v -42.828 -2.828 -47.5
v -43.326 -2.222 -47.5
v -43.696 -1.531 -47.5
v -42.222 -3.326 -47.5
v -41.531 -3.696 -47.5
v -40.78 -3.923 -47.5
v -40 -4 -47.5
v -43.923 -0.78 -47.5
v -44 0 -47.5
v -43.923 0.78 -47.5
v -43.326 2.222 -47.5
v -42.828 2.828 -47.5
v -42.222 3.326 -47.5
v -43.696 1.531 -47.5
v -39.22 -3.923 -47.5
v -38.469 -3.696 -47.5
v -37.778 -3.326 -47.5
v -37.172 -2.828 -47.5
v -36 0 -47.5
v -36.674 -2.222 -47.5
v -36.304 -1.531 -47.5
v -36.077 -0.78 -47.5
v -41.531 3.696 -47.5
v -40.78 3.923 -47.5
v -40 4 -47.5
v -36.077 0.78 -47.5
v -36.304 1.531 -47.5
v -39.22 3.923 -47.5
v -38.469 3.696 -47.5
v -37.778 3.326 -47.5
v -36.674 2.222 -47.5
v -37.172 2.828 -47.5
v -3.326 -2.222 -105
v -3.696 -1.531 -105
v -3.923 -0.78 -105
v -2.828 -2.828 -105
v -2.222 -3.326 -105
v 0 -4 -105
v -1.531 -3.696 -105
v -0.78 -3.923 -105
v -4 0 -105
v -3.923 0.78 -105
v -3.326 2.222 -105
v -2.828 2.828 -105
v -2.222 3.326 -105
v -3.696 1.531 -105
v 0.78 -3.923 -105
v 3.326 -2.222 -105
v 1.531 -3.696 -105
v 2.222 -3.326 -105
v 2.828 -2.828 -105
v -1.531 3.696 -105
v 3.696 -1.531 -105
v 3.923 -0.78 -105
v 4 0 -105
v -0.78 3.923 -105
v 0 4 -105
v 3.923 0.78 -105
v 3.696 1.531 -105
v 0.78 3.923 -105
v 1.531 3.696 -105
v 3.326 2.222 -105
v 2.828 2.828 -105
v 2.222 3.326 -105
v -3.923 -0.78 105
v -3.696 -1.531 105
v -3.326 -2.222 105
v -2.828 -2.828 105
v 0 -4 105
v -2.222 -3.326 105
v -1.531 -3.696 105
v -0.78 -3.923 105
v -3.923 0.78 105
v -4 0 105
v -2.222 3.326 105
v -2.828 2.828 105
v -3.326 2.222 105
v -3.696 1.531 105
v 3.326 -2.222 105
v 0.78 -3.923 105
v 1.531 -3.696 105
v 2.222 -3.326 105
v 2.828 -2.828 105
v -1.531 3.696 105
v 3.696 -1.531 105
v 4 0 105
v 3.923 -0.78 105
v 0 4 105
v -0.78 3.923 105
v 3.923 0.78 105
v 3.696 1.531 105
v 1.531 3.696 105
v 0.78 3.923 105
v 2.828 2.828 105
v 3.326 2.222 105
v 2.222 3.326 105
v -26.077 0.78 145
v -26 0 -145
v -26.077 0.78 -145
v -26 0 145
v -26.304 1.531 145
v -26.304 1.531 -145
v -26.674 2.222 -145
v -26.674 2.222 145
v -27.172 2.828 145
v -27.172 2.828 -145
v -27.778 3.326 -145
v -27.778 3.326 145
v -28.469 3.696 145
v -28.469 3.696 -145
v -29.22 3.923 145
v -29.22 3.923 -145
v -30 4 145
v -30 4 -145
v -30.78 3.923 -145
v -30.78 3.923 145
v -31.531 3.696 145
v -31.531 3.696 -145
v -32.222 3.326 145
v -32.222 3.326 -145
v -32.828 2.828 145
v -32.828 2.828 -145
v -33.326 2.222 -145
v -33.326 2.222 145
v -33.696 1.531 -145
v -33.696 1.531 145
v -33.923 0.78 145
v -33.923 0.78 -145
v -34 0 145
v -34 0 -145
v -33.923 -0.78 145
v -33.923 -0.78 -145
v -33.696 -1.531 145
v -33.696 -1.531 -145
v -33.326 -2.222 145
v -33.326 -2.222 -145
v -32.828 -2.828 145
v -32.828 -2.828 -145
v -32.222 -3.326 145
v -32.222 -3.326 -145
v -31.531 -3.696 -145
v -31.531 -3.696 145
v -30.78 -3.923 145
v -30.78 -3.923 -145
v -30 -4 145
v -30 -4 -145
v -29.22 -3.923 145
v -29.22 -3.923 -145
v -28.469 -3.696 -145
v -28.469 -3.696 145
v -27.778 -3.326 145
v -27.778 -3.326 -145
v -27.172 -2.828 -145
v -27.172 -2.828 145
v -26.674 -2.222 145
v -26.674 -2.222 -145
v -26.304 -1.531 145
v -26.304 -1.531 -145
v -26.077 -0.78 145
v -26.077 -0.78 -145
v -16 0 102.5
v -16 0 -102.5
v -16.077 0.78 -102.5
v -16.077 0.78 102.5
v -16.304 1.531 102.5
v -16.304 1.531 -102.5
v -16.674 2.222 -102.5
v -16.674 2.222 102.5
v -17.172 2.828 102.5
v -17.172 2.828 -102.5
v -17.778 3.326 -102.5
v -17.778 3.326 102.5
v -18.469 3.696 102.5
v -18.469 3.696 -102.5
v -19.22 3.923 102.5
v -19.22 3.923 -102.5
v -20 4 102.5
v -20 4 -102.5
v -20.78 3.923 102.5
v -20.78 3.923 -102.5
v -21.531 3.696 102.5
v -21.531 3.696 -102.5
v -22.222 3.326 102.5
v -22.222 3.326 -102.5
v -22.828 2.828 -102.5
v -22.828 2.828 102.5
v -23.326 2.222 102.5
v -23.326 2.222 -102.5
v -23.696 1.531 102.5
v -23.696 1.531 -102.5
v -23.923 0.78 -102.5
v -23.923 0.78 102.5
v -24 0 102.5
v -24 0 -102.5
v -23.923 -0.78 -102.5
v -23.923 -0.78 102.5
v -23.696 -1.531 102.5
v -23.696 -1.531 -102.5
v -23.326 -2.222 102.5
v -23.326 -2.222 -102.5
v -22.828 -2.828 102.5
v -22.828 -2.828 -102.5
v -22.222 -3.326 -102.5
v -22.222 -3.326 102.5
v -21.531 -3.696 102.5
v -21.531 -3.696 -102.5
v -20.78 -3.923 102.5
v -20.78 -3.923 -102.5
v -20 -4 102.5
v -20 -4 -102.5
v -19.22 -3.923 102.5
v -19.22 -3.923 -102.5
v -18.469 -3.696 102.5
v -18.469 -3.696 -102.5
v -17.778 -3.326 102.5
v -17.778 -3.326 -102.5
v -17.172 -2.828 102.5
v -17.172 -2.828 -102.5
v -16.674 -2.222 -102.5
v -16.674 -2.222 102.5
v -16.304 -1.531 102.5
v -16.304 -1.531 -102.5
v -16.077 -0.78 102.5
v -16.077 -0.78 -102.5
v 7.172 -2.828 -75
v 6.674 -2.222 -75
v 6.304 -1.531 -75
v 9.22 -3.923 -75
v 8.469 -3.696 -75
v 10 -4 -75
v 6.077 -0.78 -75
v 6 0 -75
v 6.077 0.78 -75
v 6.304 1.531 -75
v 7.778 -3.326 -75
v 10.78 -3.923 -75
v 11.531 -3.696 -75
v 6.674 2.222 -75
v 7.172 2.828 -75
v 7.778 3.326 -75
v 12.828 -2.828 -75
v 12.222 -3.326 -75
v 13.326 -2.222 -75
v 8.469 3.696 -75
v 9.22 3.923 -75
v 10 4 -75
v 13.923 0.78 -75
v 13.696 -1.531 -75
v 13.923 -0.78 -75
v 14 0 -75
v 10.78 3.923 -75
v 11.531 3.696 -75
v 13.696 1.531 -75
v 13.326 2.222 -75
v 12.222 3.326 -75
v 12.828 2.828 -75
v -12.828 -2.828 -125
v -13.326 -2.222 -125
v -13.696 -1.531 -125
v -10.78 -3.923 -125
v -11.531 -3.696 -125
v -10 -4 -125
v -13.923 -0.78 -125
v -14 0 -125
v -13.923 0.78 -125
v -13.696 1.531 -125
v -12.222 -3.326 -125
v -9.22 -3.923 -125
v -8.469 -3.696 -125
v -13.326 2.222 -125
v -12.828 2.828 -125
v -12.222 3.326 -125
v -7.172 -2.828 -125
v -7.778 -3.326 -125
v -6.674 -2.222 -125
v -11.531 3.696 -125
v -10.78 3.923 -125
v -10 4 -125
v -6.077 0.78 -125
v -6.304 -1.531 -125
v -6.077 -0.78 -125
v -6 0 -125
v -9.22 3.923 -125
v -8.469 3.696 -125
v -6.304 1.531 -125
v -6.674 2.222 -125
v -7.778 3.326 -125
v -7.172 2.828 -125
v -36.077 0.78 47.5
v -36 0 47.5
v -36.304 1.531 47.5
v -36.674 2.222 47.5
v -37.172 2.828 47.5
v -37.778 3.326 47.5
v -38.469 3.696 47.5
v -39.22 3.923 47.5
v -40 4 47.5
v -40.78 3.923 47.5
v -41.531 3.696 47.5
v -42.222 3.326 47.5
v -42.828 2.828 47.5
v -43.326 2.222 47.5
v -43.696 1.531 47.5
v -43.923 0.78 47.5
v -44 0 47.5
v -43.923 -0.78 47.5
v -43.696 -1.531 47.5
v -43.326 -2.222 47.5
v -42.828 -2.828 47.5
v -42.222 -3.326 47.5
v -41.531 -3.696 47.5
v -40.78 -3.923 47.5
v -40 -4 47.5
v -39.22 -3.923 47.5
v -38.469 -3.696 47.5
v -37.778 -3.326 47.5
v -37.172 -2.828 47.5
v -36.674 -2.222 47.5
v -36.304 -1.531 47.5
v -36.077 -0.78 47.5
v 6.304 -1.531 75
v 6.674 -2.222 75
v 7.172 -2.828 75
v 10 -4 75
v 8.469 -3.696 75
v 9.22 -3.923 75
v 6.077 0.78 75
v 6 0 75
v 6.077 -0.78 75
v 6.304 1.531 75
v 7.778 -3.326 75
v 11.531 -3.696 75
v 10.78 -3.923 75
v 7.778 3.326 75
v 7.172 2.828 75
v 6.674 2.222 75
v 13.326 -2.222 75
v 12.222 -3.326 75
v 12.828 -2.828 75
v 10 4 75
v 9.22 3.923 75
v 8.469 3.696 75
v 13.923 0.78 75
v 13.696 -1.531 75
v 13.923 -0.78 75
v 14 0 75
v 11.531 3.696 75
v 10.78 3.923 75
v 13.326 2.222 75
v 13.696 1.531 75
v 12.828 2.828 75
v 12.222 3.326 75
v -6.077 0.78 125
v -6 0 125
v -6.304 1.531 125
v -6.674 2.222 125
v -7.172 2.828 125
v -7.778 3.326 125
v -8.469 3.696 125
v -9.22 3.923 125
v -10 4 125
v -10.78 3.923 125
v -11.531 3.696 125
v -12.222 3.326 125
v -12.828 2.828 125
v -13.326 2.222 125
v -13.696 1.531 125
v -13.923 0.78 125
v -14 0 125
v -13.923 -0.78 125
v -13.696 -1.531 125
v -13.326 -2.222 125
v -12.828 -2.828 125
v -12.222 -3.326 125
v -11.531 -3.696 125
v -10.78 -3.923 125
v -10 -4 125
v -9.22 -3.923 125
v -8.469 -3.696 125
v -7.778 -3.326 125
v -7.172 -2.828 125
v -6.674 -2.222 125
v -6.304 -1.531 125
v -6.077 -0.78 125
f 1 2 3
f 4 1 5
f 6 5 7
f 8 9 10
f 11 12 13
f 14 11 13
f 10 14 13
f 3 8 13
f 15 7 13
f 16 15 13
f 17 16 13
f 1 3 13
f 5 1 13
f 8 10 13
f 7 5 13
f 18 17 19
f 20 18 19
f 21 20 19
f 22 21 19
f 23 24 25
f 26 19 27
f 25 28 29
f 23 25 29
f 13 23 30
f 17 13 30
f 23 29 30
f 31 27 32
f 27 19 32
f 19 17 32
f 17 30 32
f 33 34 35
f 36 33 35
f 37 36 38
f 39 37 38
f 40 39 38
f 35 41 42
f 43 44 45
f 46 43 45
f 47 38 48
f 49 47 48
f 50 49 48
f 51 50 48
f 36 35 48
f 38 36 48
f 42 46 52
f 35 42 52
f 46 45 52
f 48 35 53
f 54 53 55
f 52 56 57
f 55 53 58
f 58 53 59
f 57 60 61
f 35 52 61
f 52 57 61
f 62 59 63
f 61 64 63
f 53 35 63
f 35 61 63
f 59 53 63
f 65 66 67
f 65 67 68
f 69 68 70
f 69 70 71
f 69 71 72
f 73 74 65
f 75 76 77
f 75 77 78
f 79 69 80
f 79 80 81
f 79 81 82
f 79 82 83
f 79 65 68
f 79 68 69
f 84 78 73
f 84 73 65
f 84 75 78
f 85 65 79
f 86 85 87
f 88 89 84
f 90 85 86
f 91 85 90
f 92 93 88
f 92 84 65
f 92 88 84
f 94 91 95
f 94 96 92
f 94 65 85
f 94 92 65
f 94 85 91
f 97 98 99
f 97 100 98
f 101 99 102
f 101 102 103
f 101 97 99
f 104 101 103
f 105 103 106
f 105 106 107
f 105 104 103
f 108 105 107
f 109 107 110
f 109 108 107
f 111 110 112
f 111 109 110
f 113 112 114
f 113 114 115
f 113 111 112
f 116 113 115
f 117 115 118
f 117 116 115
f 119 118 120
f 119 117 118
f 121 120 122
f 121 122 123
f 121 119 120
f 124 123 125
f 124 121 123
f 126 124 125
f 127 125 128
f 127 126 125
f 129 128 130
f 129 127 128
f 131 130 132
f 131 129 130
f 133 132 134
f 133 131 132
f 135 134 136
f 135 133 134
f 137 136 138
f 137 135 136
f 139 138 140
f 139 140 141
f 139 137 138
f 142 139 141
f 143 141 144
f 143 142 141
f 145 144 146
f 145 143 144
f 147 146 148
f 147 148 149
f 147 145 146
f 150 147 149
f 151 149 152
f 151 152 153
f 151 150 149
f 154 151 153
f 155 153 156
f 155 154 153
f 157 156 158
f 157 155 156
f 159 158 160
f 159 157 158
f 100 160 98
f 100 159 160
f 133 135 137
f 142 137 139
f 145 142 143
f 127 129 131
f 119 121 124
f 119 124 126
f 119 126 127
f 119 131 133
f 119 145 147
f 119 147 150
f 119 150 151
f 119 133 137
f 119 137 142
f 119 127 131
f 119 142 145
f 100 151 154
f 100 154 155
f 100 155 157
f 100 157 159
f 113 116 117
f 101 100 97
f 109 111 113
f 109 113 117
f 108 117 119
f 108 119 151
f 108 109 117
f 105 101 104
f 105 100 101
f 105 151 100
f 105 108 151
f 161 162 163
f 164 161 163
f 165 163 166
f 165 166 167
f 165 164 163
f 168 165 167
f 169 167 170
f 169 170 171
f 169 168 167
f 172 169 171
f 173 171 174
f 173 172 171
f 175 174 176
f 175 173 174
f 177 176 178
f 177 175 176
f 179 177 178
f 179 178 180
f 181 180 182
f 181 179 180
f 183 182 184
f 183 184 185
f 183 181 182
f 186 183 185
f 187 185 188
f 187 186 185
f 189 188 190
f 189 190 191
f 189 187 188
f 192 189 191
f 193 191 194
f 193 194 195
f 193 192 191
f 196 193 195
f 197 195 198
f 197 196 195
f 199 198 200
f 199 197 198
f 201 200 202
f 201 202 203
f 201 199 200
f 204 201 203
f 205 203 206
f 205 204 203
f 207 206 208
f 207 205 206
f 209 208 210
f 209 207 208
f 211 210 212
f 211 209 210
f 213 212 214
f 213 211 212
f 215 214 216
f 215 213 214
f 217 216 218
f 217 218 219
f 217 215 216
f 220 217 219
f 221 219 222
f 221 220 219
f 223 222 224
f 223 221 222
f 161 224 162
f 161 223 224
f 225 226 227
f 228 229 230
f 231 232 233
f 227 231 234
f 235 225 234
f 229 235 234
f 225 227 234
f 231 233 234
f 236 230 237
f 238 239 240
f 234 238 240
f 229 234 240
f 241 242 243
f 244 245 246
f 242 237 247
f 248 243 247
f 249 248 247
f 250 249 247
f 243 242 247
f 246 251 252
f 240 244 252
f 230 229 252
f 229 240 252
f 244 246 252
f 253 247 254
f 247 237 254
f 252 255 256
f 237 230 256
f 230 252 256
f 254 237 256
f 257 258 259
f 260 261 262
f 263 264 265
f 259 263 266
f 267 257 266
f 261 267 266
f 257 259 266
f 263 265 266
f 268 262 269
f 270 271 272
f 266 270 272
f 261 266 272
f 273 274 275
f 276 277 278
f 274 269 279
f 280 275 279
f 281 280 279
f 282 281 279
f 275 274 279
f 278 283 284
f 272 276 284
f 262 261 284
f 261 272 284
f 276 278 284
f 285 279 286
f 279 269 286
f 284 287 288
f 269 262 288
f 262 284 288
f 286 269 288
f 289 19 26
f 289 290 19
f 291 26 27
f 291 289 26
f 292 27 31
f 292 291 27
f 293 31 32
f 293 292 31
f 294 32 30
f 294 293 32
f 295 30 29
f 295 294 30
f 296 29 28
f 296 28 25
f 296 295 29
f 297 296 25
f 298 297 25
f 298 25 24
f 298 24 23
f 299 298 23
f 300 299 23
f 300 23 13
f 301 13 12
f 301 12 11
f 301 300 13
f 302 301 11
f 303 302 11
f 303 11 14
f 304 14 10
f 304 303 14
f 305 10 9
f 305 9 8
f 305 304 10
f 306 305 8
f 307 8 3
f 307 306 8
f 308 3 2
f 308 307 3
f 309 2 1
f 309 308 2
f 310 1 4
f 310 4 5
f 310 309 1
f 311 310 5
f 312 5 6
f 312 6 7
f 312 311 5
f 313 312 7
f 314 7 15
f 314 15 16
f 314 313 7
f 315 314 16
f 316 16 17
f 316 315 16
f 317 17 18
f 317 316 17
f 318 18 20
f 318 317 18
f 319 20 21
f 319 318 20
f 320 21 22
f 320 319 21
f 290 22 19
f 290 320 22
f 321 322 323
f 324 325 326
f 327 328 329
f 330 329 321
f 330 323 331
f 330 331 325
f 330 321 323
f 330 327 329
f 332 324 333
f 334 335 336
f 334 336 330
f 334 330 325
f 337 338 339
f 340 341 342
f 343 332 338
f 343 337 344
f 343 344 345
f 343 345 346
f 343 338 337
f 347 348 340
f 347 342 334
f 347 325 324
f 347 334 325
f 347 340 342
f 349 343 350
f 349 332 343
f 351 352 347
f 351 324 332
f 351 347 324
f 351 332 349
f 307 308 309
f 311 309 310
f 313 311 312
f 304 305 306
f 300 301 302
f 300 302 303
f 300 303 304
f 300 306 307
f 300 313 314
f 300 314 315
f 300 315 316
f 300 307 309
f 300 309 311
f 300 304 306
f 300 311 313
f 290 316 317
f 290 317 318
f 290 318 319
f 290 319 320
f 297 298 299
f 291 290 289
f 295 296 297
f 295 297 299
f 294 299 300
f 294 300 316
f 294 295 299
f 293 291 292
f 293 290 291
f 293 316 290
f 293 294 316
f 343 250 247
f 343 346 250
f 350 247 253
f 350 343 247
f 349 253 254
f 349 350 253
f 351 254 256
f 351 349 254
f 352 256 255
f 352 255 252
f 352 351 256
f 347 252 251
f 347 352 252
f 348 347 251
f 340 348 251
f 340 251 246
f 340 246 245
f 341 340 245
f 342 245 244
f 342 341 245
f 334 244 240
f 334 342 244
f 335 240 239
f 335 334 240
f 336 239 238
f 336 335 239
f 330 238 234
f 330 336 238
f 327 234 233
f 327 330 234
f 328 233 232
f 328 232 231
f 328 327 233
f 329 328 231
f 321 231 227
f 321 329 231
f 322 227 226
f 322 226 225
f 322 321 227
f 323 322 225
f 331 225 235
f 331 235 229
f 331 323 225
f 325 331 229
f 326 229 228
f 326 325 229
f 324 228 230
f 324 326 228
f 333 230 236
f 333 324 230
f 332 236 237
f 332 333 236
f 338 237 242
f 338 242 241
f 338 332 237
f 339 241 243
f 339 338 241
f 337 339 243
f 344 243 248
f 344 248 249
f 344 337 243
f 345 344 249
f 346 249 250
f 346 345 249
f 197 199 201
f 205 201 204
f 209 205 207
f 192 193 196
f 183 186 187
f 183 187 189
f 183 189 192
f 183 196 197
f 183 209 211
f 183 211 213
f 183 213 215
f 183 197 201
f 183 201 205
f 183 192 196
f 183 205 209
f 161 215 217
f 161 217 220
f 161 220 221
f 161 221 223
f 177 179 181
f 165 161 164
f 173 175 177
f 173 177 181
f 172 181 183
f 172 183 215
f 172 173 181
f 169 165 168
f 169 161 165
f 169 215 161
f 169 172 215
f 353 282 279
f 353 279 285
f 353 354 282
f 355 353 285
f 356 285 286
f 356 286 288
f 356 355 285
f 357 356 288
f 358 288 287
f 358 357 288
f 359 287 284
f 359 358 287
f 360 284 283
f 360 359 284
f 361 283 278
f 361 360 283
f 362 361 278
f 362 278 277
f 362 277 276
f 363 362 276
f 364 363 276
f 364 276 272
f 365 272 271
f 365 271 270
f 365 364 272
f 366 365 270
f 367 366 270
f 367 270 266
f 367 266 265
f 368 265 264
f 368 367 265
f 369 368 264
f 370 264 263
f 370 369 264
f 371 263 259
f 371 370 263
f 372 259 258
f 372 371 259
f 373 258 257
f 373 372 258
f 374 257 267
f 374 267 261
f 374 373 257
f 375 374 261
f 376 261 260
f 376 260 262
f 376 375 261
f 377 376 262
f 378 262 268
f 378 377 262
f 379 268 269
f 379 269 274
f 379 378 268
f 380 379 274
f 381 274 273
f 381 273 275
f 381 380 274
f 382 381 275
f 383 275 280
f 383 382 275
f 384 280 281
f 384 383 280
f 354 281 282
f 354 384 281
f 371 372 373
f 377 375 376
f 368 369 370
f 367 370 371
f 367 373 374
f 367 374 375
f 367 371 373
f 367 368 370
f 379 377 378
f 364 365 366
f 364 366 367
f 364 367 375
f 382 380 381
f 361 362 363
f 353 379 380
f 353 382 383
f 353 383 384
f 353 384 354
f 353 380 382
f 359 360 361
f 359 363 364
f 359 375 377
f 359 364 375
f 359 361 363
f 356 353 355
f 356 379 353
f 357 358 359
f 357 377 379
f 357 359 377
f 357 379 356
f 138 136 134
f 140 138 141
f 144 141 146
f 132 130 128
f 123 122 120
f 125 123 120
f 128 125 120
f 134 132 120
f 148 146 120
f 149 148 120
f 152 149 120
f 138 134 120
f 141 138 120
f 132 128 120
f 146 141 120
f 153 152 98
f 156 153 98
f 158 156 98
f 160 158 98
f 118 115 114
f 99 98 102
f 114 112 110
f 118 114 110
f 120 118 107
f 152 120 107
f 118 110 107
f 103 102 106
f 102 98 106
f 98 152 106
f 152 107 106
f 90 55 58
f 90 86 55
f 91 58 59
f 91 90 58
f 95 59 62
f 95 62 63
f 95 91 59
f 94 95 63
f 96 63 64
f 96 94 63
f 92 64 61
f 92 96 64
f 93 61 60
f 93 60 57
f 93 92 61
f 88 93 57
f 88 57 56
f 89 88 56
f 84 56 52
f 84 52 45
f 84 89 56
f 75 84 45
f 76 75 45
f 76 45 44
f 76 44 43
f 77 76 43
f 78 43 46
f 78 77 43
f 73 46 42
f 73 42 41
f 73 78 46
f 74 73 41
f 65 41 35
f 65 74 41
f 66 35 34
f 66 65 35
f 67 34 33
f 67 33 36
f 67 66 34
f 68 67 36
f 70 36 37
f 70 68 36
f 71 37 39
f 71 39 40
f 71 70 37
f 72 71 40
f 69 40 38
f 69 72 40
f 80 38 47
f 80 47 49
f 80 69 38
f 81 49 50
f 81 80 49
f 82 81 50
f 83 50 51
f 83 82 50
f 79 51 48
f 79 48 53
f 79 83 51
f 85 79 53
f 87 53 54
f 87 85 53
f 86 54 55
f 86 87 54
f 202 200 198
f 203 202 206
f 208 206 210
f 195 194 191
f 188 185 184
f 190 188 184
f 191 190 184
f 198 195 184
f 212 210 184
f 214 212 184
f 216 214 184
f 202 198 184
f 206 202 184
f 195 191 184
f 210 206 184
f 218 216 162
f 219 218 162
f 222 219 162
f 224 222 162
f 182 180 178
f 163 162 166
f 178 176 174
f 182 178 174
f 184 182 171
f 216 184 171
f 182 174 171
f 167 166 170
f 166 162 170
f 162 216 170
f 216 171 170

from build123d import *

# Parameters (mm, degrees)
F0_R      = 4
F1_DEPTH  = 105
F2_R      = 4
F3_DEPTH  = 75
F4_R      = 4
F5_DEPTH  = 125
F6_R      = 4
F7_DEPTH  = 102.5
F8_R      = 4
F9_DEPTH  = 145
F10_R     = 4
F11_DEPTH = 47.5


with BuildPart() as f1:
    # F0 (on Top) → F1 (new body, symmetric)
    with BuildSketch(Plane.XY):
        Circle(F0_R)
    extrude(amount=F1_DEPTH, both=True)


with BuildPart() as f3:
    # F2 (on Top) → F3 (new body, symmetric)
    with BuildSketch(Plane.XY):
        with Locations((10, 0)):
            Circle(F2_R)
    extrude(amount=F3_DEPTH, both=True)


with BuildPart() as f5:
    # F4 (on Top) → F5 (new body, symmetric)
    with BuildSketch(Plane.XY):
        with Locations((-10, 0)):
            Circle(F4_R)
    extrude(amount=F5_DEPTH, both=True)


with BuildPart() as f7:
    # F6 (on Top) → F7 (new body, symmetric)
    with BuildSketch(Plane.XY):
        with Locations((-20, 0)):
            Circle(F6_R)
    extrude(amount=F7_DEPTH, both=True)


with BuildPart() as f9:
    # F8 (on Top) → F9 (new body, symmetric)
    with BuildSketch(Plane.XY):
        with Locations((-30, 0)):
            Circle(F8_R)
    extrude(amount=F9_DEPTH, both=True)


with BuildPart() as f11:
    # F10 (on Top) → F11 (new body, symmetric)
    with BuildSketch(Plane.XY):
        with Locations((-40, 0)):
            Circle(F10_R)
    extrude(amount=F11_DEPTH, both=True)


solid = Compound([f1.part, f3.part, f5.part, f7.part, f9.part, f11.part])
